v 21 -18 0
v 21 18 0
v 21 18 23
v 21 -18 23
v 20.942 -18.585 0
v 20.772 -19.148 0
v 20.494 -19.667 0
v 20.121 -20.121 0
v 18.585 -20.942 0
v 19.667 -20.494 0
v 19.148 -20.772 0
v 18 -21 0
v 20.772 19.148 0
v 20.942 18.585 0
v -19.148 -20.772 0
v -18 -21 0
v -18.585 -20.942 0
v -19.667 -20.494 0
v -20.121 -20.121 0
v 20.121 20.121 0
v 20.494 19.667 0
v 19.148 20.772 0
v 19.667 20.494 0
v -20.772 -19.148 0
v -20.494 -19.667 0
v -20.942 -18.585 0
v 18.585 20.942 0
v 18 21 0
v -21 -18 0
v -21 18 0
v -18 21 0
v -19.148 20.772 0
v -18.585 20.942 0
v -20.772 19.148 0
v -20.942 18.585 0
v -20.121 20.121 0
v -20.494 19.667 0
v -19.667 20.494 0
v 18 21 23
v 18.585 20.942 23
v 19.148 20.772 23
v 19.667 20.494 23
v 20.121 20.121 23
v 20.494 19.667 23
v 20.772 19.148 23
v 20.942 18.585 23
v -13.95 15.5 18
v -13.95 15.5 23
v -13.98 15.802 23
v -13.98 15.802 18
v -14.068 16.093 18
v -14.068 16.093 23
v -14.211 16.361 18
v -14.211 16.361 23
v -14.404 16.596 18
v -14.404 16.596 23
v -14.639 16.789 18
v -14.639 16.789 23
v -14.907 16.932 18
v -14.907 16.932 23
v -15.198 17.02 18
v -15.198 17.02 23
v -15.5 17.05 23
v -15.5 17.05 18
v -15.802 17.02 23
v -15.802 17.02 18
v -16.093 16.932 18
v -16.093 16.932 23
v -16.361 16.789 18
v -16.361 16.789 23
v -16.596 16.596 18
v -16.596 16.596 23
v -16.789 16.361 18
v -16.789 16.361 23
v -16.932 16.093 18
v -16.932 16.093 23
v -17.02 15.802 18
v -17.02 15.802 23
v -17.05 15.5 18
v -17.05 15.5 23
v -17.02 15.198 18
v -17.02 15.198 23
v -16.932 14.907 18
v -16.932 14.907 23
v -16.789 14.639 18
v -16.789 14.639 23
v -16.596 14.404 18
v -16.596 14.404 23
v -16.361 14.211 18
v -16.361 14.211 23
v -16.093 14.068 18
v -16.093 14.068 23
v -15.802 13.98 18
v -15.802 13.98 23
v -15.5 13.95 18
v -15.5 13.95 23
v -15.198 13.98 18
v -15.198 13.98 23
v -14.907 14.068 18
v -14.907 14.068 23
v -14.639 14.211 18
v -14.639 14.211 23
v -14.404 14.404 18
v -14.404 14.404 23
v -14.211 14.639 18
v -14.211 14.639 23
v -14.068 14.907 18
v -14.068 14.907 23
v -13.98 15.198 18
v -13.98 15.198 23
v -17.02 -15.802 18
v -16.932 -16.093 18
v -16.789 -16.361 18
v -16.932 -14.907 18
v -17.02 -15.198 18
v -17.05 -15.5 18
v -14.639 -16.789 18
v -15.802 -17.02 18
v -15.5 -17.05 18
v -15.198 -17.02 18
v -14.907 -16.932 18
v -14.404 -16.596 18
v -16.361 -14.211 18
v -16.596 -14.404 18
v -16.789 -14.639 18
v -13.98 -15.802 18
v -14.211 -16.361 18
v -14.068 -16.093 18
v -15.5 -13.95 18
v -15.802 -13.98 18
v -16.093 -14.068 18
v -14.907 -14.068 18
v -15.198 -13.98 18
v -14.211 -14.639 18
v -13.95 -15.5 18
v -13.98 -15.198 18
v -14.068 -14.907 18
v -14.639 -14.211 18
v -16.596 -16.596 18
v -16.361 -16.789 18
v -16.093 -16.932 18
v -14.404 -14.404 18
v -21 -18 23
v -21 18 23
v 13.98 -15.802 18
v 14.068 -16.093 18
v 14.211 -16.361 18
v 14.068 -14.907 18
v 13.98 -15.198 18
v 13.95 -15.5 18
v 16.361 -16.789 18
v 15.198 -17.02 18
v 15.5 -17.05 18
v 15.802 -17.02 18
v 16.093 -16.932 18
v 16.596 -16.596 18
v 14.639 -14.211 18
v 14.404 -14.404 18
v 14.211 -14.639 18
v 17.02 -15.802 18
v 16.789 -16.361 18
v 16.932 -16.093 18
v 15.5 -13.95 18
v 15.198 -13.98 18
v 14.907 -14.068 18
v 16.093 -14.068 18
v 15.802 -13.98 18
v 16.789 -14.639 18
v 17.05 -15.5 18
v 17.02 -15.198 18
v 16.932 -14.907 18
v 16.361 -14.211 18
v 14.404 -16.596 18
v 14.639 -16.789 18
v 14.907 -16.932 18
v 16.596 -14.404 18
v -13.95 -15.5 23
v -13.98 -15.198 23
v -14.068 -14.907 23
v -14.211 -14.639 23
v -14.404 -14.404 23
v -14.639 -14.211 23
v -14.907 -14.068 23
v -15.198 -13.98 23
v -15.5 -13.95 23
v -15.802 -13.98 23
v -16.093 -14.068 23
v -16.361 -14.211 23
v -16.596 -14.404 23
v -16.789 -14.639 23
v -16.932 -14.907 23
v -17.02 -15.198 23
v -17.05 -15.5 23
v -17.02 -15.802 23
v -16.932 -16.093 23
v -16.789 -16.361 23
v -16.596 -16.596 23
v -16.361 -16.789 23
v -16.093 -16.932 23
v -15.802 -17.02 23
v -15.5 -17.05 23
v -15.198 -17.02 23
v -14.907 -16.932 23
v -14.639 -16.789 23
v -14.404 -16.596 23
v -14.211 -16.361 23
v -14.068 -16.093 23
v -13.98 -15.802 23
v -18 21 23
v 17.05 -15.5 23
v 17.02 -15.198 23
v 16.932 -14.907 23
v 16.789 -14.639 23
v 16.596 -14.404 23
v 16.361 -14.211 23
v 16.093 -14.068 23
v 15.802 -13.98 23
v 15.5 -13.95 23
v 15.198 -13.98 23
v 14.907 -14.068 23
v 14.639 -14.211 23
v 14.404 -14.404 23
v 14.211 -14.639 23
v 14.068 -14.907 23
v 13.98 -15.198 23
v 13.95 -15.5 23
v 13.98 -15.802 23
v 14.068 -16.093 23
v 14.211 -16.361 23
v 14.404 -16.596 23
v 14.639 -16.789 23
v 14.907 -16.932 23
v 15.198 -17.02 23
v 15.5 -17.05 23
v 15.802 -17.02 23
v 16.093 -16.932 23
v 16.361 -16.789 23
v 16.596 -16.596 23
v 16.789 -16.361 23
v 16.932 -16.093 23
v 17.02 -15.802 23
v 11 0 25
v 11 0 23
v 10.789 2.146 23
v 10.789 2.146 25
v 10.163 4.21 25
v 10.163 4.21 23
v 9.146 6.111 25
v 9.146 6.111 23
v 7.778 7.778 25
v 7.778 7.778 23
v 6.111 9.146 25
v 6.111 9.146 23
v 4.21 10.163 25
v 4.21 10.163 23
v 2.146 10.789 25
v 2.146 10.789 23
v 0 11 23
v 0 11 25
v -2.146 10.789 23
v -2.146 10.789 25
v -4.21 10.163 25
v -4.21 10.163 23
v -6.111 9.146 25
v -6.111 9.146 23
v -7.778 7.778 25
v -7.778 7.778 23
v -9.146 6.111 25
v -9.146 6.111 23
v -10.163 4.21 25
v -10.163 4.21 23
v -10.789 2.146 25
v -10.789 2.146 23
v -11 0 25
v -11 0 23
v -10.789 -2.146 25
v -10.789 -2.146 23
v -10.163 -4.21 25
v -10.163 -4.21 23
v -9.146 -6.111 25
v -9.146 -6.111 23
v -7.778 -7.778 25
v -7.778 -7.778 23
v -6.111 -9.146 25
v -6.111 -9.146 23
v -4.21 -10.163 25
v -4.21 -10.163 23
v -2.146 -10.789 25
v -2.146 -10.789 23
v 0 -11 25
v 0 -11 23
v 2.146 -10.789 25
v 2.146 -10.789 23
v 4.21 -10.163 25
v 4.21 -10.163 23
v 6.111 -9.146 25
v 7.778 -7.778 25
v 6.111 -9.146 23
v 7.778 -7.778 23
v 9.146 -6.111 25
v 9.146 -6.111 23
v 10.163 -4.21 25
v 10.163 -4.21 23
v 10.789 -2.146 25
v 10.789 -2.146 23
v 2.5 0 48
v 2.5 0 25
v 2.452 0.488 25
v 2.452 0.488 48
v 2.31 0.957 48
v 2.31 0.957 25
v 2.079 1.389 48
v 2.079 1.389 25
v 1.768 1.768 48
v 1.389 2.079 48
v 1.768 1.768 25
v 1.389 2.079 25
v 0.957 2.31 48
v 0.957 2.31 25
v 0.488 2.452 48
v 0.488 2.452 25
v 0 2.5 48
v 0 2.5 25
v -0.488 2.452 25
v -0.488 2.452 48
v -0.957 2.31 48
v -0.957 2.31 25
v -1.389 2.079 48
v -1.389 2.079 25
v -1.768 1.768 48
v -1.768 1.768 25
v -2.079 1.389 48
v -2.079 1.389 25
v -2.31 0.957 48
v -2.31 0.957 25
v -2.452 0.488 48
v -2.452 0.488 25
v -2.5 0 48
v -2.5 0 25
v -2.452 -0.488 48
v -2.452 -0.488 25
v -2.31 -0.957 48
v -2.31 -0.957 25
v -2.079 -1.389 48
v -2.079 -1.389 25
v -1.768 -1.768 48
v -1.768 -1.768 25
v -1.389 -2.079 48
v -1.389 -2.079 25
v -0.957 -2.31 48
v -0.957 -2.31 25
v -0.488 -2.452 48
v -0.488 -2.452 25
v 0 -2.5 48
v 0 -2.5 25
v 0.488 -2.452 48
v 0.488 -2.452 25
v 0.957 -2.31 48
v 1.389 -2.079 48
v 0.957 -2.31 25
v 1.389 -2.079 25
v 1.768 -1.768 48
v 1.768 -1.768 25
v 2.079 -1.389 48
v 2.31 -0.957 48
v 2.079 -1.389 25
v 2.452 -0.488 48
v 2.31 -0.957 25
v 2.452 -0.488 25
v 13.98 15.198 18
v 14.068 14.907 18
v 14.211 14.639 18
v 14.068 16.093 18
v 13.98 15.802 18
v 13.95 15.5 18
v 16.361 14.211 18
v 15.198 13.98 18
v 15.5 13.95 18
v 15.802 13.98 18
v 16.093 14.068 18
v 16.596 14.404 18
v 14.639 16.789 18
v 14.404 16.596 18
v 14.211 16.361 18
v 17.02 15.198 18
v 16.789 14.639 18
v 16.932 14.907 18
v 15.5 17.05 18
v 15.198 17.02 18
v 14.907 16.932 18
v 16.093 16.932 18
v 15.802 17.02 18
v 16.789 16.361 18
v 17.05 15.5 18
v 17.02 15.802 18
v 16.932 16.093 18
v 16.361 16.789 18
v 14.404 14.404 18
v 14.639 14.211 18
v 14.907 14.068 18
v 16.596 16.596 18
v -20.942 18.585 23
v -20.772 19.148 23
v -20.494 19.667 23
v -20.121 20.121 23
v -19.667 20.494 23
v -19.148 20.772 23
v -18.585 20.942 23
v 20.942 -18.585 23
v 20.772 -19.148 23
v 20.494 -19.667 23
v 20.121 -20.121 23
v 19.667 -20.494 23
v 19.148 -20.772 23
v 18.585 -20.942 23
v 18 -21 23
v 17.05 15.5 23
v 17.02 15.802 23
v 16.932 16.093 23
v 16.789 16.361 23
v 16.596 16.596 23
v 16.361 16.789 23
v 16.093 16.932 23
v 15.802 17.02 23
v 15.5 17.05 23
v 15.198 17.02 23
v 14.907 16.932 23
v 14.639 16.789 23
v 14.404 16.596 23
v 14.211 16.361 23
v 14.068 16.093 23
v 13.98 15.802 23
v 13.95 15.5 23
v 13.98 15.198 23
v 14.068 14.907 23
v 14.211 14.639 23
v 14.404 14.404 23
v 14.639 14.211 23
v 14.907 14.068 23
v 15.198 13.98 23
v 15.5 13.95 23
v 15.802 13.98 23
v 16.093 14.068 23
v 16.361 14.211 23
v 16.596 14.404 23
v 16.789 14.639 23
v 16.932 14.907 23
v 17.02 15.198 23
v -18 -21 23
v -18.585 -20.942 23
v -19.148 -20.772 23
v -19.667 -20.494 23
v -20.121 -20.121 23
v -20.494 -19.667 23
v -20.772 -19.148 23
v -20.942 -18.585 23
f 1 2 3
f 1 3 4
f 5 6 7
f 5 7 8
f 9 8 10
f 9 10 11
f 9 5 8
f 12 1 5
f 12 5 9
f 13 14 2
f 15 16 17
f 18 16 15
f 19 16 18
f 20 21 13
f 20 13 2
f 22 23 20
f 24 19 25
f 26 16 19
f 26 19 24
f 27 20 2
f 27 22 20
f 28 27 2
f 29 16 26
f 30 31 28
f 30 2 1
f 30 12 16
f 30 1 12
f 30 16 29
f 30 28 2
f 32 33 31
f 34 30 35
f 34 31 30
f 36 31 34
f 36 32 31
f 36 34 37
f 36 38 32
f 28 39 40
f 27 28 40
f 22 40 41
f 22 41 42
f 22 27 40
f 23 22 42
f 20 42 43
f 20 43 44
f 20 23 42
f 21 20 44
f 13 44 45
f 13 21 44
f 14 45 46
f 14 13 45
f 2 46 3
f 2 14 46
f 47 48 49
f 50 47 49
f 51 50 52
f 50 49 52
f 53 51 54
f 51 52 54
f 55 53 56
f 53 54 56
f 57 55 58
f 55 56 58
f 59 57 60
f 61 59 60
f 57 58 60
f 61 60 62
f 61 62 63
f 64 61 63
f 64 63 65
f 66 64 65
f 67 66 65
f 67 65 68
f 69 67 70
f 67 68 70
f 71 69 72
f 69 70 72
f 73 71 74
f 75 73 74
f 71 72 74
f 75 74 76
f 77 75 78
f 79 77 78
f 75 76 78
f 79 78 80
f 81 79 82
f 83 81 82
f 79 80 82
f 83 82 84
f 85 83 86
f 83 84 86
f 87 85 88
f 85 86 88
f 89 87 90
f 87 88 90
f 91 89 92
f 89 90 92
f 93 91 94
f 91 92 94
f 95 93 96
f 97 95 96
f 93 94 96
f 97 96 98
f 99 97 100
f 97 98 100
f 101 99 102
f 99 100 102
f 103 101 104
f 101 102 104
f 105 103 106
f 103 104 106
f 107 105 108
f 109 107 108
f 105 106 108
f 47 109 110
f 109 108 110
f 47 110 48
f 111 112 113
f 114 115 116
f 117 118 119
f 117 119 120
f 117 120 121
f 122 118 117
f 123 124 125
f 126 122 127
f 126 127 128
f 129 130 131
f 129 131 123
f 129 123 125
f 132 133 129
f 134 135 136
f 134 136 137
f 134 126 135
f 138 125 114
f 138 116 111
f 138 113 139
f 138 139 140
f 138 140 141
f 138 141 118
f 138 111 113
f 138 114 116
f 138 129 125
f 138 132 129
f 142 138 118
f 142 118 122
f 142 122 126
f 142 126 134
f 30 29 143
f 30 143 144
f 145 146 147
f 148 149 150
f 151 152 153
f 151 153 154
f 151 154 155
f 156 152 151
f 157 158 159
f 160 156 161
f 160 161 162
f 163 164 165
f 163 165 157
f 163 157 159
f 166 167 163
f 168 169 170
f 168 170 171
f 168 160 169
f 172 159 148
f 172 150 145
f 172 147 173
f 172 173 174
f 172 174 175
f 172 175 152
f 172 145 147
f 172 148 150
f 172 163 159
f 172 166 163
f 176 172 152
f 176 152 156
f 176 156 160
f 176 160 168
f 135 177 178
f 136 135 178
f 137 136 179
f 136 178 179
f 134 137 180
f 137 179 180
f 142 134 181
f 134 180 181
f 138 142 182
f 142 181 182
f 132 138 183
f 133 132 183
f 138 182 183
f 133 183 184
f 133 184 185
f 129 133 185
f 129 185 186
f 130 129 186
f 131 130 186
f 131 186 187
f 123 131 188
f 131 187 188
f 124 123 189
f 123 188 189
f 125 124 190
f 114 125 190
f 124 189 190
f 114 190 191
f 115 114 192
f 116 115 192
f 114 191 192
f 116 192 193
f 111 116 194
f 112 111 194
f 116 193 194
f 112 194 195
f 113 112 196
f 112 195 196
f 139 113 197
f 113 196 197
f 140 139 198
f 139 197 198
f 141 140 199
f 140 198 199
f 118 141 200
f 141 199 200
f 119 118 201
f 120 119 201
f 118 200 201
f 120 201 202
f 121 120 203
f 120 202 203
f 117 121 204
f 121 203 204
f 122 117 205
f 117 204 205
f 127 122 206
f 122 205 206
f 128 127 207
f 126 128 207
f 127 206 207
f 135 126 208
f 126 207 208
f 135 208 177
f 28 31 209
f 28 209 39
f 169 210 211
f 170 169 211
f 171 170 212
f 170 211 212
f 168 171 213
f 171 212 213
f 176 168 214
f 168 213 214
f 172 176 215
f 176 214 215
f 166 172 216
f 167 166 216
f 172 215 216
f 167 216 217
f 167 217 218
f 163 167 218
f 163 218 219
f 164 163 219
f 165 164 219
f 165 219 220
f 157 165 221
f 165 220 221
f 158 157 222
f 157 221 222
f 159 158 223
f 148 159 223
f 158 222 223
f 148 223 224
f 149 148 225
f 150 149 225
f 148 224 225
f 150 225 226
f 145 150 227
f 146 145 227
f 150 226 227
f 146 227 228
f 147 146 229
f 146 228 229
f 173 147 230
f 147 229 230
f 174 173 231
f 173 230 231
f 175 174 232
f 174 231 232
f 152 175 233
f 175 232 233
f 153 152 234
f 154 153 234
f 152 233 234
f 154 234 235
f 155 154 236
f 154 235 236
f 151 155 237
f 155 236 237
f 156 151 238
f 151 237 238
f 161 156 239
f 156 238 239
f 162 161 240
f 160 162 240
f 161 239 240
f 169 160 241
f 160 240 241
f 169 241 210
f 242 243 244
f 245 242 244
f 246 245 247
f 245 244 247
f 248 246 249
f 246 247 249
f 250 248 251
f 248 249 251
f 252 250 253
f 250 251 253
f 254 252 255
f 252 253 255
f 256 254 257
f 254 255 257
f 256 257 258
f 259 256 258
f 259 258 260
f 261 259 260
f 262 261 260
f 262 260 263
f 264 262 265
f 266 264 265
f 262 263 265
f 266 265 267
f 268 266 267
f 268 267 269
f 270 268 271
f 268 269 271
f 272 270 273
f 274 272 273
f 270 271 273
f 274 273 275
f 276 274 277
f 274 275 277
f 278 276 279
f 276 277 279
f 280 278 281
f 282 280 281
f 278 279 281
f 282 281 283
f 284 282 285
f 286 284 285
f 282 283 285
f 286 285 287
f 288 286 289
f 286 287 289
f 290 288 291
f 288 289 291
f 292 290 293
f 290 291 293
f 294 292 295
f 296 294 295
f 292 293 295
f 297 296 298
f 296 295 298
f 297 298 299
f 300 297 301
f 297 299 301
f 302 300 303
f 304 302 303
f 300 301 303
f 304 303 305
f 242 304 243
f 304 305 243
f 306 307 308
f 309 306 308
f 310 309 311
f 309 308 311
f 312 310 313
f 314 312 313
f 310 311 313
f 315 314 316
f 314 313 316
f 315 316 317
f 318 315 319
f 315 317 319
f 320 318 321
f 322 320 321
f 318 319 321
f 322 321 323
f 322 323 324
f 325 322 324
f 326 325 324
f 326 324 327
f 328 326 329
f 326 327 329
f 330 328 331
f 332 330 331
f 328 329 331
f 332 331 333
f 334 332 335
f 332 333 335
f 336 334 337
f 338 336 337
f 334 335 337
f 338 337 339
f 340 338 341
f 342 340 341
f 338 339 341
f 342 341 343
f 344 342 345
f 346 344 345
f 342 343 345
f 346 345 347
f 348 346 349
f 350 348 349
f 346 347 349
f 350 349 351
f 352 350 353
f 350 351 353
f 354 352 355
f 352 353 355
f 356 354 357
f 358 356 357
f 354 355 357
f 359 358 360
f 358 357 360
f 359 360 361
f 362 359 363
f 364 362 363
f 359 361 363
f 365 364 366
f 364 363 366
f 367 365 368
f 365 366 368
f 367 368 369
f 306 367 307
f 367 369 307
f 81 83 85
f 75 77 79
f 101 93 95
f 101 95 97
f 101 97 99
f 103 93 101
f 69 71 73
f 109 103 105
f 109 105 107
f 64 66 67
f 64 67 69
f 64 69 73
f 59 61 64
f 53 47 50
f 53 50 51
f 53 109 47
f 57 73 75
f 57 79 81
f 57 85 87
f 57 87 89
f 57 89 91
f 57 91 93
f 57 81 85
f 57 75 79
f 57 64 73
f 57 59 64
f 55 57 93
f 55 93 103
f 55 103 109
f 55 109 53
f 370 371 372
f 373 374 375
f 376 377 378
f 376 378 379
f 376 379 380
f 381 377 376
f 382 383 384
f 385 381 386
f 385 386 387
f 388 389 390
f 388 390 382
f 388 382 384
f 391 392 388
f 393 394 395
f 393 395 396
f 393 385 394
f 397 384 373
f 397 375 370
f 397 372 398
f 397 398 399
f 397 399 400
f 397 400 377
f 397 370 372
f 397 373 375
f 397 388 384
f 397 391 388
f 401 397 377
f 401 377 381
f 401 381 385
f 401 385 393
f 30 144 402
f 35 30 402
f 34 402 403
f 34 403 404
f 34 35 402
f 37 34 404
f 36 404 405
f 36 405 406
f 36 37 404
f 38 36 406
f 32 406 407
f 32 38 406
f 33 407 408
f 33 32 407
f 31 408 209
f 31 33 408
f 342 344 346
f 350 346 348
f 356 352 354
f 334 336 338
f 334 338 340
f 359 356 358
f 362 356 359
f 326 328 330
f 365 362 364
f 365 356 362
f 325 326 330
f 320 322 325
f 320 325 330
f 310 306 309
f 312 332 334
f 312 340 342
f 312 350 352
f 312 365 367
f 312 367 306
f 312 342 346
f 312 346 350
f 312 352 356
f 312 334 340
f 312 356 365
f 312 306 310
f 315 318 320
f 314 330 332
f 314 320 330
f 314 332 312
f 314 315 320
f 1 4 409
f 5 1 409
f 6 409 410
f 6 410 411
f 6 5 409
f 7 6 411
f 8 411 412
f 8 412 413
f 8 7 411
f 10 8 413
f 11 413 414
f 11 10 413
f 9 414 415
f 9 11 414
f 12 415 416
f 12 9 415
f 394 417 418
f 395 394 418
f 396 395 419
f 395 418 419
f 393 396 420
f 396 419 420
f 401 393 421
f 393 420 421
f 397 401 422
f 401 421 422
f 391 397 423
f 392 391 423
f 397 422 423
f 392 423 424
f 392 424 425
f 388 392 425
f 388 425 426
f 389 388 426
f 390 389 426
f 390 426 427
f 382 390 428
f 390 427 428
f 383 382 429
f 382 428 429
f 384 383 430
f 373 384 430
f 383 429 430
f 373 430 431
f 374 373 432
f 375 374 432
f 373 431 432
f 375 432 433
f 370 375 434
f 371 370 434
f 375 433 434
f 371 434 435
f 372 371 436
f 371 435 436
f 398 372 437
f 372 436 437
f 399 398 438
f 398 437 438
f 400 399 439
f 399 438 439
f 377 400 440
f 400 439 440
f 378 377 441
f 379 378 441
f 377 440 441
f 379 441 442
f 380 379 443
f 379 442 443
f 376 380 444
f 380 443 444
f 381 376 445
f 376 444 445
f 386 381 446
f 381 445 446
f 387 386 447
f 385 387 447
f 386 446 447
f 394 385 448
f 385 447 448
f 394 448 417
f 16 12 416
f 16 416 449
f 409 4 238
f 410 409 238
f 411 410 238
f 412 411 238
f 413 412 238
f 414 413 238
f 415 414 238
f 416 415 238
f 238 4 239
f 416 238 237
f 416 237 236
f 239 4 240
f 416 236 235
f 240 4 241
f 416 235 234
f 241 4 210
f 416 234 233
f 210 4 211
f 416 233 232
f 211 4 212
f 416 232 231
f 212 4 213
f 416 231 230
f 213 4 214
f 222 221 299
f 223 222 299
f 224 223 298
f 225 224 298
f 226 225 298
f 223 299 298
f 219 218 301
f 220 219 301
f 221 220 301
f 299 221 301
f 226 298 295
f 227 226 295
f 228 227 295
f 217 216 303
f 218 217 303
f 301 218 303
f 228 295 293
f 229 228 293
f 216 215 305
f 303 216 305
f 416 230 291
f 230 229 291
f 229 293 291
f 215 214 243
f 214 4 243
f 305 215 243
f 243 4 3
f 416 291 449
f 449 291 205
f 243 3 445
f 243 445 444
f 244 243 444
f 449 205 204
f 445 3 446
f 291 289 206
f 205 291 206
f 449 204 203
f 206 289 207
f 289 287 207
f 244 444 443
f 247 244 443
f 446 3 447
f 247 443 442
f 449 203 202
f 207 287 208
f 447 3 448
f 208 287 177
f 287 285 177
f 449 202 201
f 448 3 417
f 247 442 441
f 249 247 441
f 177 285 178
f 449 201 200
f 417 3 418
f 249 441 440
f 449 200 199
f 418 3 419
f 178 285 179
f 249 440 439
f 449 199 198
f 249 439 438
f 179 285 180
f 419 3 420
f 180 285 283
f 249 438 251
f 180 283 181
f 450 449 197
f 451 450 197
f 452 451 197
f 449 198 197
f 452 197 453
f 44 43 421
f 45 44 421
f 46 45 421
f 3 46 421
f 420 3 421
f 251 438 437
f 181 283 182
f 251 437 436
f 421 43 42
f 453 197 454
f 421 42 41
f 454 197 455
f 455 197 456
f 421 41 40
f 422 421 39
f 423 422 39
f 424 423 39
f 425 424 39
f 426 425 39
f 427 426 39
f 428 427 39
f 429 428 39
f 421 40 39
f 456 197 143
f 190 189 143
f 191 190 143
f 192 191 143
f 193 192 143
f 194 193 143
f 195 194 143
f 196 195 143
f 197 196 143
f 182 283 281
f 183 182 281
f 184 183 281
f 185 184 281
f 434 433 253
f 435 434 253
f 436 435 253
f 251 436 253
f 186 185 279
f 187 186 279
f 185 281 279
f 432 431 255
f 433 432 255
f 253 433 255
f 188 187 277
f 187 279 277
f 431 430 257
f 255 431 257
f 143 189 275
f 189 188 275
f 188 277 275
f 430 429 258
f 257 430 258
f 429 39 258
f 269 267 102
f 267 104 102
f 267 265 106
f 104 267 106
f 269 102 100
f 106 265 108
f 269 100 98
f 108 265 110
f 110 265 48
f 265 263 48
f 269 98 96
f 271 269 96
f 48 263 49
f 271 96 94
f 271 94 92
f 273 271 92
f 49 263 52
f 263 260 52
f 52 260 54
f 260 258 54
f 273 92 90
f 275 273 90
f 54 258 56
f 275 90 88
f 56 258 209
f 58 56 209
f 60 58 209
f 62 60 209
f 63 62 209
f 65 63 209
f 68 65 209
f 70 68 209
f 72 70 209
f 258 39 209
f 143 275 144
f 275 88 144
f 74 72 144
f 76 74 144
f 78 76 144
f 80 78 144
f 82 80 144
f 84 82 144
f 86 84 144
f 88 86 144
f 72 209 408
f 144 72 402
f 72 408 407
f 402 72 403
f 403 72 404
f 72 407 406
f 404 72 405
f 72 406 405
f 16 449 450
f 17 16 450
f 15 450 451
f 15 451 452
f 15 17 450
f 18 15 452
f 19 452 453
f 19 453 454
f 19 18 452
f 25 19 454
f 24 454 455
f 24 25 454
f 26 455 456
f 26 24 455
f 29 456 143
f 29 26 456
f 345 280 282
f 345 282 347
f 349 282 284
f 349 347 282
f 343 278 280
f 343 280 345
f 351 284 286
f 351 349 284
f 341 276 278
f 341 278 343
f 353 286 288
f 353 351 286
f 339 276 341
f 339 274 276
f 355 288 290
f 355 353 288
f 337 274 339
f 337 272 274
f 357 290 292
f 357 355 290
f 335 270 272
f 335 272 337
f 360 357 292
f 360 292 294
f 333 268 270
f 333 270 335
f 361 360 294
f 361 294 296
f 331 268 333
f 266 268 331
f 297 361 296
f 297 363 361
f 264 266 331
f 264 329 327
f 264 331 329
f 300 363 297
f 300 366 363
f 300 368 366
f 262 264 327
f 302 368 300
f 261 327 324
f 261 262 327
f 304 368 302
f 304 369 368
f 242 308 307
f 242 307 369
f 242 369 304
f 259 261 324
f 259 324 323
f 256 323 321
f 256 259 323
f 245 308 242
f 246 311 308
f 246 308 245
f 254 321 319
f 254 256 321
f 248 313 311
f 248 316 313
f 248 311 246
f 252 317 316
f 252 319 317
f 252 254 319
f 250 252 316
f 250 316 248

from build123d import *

# Parameters (mm, degrees)
EXTRUDE_1_DEPTH     = 23
SKETCH_2_R          = 11
EXTRUDE_2_DEPTH     = 2
SKETCH_3_R          = 2.5
EXTRUDE_3_DEPTH     = 23
SKETCH_4_R          = 1.55
CUT_EXTRUDE_1_DEPTH = 5


with BuildPart() as part:
    # 草图1 → 凸台-拉伸1 (new body)
    with BuildSketch(Plane.XY):
        with BuildLine():
            Line((-18, 21), (18, 21))
            ThreePointArc((18, 21), (20.121320344, 20.121320344), (21, 18))
            Line((21, 18), (21, -18))
            ThreePointArc((21, -18), (20.121320344, -20.121320344), (18, -21))
            Line((18, -21), (-18, -21))
            ThreePointArc((-18, -21), (-20.121320344, -20.121320344), (-21, -18))
            Line((-21, -18), (-21, 18))
            ThreePointArc((-21, 18), (-20.121320344, 20.121320344), (-18, 21))
        make_face()
    extrude(amount=EXTRUDE_1_DEPTH)

    # 草图2 → 凸台-拉伸2 (add)
    with BuildSketch(Plane.XY.offset(23)):
        Circle(SKETCH_2_R)
    extrude(amount=EXTRUDE_2_DEPTH)

    # 草图3 → 凸台-拉伸3 (add)
    with BuildSketch(Plane.XY.offset(25)):
        Circle(SKETCH_3_R)
    extrude(amount=EXTRUDE_3_DEPTH)

    # 草图4 → 切除-拉伸1 (cut)
    with BuildSketch(Plane.XY.offset(23)):
        with Locations((-15.5, 15.5)):
            Circle(SKETCH_4_R)
        with Locations((15.5, 15.5)):
            Circle(SKETCH_4_R)
        with Locations((15.5, -15.5)):
            Circle(SKETCH_4_R)
        with Locations((-15.5, -15.5)):
            Circle(SKETCH_4_R)
    extrude(amount=-CUT_EXTRUDE_1_DEPTH, mode=Mode.SUBTRACT)


solid = part.part
